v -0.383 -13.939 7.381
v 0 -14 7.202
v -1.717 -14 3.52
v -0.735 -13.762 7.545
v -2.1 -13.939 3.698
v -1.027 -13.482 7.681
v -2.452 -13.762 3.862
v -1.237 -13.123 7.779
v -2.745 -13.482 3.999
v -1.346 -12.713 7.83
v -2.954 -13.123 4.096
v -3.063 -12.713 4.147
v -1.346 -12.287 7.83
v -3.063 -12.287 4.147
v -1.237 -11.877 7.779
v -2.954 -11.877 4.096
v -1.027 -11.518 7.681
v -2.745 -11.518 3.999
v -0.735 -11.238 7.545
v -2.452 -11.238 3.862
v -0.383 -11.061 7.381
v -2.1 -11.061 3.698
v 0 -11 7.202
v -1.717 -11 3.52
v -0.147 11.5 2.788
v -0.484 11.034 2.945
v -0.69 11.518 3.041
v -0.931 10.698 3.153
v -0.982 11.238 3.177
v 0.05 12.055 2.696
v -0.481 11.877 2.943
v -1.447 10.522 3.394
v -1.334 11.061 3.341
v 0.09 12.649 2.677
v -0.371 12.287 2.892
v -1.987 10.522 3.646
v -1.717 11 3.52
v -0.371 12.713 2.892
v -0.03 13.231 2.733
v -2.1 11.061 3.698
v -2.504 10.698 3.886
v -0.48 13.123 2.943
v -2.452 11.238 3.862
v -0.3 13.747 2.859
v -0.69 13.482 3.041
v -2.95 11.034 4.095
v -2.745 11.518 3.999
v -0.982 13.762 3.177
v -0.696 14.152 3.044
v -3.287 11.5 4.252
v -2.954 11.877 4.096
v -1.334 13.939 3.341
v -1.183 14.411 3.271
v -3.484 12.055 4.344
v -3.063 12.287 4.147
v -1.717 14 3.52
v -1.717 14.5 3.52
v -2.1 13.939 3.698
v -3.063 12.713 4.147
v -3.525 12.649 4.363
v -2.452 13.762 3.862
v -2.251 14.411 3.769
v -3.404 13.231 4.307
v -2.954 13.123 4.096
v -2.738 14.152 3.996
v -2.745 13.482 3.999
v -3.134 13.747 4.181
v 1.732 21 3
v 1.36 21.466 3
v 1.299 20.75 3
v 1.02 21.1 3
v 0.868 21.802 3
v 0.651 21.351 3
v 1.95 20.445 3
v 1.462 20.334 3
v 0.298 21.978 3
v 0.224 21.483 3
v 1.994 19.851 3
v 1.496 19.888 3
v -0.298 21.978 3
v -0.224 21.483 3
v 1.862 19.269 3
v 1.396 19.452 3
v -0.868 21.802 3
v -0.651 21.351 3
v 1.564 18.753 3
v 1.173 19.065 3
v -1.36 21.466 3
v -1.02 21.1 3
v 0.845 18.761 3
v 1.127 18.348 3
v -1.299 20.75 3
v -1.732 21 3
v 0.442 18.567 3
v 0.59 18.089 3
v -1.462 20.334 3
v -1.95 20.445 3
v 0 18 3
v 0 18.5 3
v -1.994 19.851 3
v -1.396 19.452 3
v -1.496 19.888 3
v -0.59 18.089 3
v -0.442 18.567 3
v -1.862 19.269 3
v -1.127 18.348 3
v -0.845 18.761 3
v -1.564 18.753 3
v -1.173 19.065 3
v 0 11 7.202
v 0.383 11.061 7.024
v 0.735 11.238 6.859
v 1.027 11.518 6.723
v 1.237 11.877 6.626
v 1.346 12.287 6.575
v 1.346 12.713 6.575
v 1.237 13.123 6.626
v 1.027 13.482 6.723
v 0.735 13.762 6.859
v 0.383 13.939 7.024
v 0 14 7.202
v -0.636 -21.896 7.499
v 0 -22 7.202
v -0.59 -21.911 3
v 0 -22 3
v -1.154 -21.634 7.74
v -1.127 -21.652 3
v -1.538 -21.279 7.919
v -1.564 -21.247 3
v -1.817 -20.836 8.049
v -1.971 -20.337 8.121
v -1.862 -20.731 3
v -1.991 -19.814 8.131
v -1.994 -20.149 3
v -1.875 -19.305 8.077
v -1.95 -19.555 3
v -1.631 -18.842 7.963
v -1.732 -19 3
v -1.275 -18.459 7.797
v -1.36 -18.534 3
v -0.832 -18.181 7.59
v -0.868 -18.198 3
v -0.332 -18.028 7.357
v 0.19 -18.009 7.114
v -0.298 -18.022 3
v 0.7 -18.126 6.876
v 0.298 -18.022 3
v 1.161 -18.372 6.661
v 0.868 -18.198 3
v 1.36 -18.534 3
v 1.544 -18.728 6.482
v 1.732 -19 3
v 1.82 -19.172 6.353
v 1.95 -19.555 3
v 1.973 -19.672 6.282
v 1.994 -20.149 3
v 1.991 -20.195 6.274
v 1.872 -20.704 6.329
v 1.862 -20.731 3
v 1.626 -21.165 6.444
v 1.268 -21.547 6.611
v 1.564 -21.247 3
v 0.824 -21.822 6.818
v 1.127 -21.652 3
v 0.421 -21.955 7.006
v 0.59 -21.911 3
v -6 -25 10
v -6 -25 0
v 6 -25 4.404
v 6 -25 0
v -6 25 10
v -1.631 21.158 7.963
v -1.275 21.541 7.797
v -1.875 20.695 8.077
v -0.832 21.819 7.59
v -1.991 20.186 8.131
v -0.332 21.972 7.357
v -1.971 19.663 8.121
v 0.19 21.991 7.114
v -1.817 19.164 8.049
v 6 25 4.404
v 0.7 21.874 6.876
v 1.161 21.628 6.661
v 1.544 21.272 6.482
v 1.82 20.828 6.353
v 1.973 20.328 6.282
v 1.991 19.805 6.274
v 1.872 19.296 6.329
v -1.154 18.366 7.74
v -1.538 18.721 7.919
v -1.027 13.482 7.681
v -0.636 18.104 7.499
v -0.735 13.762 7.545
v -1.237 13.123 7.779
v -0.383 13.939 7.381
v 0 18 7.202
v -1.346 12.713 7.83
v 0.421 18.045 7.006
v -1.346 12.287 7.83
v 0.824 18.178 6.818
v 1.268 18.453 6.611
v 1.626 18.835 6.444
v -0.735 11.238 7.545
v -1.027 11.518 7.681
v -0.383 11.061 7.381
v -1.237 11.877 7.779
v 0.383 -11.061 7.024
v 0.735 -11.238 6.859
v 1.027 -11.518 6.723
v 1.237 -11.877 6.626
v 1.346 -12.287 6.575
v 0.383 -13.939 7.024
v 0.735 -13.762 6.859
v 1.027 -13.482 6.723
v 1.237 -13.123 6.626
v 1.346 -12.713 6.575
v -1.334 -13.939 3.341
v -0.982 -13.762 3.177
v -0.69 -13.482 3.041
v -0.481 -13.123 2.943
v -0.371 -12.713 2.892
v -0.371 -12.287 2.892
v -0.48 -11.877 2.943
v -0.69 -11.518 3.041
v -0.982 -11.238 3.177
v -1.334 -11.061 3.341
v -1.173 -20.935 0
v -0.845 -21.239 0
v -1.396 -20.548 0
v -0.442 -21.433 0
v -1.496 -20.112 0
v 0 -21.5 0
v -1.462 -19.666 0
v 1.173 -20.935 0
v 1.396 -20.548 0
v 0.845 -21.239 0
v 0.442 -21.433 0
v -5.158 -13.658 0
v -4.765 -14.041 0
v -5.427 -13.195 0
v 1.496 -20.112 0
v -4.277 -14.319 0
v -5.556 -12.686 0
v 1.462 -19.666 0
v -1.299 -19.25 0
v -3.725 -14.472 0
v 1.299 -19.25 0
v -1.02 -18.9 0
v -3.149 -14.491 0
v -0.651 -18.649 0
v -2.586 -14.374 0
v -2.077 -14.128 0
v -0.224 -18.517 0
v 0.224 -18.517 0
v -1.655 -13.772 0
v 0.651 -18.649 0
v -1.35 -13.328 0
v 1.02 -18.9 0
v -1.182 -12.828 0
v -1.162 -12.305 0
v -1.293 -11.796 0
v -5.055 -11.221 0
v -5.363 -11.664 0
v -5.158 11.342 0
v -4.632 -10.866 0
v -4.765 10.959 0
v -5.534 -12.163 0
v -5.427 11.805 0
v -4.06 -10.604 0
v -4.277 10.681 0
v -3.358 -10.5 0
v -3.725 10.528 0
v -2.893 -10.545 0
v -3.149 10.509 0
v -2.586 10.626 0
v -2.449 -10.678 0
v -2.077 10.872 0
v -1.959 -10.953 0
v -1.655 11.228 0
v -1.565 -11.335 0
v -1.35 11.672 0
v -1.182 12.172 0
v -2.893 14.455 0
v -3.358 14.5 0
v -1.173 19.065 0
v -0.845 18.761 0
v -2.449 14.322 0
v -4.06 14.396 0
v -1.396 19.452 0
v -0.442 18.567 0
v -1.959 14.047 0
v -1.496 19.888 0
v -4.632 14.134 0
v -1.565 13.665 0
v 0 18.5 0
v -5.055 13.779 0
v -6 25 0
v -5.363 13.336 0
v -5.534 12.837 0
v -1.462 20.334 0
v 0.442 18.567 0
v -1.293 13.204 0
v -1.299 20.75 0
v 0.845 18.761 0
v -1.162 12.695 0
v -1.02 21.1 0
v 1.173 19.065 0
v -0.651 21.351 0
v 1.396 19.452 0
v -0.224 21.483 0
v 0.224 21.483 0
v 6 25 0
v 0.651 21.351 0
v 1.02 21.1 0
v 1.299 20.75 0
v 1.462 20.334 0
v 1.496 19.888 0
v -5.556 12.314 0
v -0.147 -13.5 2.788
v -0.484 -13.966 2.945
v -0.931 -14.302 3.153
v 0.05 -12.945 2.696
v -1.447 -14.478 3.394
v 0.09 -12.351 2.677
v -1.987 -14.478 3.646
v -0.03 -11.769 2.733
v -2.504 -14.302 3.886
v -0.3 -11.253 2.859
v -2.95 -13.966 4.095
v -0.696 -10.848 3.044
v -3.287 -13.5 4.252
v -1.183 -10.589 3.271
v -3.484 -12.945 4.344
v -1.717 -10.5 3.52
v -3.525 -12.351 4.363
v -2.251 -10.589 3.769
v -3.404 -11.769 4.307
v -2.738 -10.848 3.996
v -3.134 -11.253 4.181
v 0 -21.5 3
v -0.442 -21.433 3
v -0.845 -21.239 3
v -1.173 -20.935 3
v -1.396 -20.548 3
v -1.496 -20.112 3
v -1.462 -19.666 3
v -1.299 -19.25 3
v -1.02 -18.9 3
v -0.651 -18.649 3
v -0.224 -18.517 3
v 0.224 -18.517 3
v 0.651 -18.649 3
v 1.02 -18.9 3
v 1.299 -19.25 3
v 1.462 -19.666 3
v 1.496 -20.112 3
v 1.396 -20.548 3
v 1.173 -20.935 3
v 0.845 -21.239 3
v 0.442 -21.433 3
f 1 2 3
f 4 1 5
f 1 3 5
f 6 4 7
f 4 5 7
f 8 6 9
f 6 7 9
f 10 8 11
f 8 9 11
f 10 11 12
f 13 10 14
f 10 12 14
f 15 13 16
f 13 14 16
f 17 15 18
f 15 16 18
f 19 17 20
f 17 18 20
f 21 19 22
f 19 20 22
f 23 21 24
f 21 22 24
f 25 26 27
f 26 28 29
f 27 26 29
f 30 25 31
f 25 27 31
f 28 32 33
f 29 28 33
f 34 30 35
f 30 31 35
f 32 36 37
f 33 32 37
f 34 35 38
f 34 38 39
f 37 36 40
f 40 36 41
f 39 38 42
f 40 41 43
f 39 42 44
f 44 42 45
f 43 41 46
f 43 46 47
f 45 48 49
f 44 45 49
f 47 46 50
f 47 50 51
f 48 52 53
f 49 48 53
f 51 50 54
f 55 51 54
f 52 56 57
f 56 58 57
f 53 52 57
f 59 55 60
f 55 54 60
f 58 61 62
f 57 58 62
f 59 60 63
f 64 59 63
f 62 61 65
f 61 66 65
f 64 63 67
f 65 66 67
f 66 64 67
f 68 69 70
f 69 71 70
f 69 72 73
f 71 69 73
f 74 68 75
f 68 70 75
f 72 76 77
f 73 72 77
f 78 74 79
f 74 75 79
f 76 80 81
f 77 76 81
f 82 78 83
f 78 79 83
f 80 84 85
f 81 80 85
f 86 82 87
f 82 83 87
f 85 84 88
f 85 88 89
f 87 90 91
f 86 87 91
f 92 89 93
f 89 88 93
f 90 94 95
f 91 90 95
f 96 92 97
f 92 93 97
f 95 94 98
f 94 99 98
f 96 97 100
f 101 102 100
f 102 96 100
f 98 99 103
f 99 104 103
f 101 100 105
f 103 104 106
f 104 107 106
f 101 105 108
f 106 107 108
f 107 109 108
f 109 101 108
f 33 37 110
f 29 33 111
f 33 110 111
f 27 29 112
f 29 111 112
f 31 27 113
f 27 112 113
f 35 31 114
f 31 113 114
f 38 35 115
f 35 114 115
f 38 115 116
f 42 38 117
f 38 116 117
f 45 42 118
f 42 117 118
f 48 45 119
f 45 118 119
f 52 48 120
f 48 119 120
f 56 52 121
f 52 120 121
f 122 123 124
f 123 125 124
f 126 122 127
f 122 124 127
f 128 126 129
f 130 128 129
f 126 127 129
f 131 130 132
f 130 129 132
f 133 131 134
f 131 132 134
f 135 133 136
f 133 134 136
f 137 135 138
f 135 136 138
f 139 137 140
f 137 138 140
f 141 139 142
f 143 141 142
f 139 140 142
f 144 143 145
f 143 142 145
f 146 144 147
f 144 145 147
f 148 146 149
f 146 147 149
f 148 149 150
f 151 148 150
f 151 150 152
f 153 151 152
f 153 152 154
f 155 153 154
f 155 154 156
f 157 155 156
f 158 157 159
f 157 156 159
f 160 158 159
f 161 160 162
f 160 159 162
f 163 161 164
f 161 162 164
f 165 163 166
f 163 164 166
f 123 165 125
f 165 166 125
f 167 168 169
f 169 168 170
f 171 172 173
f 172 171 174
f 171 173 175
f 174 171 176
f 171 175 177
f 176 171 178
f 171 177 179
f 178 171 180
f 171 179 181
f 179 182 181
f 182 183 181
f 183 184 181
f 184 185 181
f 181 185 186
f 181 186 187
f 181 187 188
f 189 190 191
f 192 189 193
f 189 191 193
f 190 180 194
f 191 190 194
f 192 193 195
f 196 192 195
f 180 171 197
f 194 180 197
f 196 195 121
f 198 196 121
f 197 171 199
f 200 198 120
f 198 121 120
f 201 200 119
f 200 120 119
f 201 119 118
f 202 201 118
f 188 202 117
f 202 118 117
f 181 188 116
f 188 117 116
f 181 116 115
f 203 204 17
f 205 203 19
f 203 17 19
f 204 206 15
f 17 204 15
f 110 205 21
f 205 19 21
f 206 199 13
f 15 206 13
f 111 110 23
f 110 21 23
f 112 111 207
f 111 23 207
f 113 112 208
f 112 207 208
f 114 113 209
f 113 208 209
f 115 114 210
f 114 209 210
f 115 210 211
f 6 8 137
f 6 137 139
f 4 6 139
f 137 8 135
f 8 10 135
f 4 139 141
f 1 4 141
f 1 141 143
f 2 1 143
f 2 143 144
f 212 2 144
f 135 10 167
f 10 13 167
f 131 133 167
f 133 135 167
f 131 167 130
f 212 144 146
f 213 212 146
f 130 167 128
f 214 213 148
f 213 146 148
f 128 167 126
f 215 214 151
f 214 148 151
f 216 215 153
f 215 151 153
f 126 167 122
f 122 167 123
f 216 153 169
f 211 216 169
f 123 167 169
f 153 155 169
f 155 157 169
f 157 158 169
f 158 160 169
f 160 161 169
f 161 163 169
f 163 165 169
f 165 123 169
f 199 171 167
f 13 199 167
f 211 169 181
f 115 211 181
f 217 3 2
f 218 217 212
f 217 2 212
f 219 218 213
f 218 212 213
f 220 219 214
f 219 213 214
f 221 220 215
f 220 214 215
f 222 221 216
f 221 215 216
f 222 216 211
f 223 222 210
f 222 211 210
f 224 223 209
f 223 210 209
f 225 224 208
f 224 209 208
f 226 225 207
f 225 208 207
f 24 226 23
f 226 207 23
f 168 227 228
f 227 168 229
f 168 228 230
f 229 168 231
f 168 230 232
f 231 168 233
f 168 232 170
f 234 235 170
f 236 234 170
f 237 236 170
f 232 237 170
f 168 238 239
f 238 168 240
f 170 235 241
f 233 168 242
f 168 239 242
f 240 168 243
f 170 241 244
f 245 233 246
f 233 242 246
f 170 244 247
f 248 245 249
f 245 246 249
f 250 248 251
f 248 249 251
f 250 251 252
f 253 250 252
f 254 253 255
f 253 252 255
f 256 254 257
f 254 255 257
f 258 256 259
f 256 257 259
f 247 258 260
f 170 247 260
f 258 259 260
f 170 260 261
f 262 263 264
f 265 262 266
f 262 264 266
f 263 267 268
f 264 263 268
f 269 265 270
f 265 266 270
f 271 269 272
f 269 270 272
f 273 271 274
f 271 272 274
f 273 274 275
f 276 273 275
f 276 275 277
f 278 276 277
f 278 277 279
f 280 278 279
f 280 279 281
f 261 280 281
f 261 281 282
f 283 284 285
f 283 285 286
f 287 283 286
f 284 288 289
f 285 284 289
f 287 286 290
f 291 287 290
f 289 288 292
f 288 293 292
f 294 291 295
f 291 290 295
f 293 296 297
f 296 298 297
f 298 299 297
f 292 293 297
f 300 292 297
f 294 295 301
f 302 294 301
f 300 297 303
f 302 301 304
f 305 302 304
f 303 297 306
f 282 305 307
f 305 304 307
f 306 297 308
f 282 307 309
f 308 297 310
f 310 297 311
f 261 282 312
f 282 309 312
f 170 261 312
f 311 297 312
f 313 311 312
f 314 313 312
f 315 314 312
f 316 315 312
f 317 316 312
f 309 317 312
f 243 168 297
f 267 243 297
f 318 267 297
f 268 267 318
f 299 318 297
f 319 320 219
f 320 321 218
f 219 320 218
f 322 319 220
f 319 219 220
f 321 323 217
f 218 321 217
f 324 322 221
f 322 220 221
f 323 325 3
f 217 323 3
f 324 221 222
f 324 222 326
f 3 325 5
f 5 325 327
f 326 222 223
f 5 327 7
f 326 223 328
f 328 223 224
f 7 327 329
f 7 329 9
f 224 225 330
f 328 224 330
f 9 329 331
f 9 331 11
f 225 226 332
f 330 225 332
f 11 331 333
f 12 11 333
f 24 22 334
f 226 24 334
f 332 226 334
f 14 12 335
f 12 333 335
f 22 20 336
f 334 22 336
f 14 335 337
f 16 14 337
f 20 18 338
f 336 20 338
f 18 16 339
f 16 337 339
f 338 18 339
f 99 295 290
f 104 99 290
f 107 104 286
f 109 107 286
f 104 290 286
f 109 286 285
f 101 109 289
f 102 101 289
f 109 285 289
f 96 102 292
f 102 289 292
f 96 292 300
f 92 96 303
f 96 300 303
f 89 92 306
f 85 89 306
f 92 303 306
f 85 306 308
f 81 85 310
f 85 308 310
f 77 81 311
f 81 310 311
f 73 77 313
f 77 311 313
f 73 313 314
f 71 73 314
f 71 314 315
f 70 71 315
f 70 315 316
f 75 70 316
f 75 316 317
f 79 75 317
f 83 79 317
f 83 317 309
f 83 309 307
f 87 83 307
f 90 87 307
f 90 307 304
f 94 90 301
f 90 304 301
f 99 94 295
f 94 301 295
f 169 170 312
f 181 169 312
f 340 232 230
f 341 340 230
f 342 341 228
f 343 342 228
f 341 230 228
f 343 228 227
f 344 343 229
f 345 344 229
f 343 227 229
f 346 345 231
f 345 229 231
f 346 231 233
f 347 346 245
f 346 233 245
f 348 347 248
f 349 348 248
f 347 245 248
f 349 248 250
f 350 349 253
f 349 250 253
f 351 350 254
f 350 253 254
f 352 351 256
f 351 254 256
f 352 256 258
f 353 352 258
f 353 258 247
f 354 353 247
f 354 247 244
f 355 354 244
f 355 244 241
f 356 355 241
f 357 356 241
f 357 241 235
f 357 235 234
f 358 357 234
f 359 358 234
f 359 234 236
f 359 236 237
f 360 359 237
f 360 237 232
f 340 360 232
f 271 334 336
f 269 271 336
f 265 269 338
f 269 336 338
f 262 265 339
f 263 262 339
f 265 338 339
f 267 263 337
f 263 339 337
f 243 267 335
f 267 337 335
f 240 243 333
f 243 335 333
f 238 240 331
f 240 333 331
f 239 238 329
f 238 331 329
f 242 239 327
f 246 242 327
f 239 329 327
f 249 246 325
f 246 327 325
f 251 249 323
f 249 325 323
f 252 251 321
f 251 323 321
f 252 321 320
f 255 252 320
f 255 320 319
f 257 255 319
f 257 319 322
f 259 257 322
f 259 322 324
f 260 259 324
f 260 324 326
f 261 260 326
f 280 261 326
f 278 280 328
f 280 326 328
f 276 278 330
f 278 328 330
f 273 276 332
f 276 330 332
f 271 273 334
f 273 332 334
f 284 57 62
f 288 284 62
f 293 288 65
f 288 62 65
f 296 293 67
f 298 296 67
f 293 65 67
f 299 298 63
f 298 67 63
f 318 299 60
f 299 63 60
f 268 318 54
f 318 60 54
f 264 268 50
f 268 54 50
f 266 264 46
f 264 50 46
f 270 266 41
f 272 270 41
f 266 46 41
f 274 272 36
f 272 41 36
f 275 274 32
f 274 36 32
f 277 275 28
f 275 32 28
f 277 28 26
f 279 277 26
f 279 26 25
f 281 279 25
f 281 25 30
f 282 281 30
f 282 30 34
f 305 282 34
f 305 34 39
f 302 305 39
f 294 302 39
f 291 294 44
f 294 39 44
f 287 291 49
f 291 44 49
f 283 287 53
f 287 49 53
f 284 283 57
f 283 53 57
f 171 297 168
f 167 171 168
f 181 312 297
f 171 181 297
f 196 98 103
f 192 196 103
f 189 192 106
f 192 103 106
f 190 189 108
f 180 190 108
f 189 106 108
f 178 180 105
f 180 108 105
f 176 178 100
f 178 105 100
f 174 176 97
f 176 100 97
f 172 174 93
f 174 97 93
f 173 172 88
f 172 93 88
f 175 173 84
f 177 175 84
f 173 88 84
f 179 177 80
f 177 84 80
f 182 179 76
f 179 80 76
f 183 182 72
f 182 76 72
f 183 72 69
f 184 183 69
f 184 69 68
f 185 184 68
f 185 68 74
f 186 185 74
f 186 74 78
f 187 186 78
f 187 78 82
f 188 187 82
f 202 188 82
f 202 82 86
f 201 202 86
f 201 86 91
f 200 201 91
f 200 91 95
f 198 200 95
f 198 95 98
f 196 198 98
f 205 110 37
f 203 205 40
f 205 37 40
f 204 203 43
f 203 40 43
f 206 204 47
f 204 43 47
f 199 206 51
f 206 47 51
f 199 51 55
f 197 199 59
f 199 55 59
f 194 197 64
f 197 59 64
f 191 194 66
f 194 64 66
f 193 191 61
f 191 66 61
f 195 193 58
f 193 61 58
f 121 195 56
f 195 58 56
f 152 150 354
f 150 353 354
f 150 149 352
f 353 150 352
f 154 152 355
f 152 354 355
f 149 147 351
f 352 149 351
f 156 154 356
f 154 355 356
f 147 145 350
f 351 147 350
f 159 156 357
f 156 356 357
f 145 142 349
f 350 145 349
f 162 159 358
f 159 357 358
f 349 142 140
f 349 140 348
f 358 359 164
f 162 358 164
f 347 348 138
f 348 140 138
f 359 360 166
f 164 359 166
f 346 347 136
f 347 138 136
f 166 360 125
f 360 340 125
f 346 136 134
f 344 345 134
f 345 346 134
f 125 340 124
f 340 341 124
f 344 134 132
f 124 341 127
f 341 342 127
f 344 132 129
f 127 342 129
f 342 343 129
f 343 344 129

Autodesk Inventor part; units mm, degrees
ref_plane "YZ Plane" through (0, 0, 0) normal (1, 0, 0) x (0, 1, 0)
ref_plane "XZ Plane" through (0, 0, 0) normal (0, 1, 0) x (-1, 0, 0)
sketch "Skizze1" plane through (0, 0, 0) normal (0, 0, 1) x (1, 0, 0)
  line L0 (-6, -25) -> (6, -25)
  line L1 (6, -25) -> (6, 25)
  line L2 (6, 25) -> (-6, 25)
  line L3 (-6, 25) -> (-6, -25)
  line L4 (-6, -25) -> (6, 25) construction
  line L5 (6, -25) -> (-6, 25) construction
  line L6 (0, 20) -> (0, -20)
  point P0 (0, 0)
  point P1 (0, 0)
  dimension "d0" = 40
  dimension "d1" = 12
  dimension "d2" = 50
extrude "Extrusion1" add sketch "Skizze1" along normal blind 10
sketch "Skizze3" plane through (0, 0, 10) normal (0, 0, 1) x (1, 0, 0)
  line L0 (-6, -25) -> (6, -25) projected
  line L1 (6, -25) -> (6, 25) projected
  line L2 (6, 25) -> (-6, 25) projected
  line L3 (-6, 25) -> (-6, -25) projected
  point P0 (0, 0)
  point P1 (0, -20)
  point P2 (0, 20)
sketch "Skizze2" plane through (-6, -25, 0) normal (0, -1, 0) x (1, 0, 0)
  line L0 (0, 0) -> (12, 0) projected
  line L1 (12, 0) -> (12, 10) projected
  line L2 (0, 10) -> (12, 10) projected
  line L3 (0, 0) -> (0, 10) projected
  line L4 (0, 10) -> (12, 4.4043)
  point P0 (6, 0)
  dimension "d5" = 25
extrude "Extrusion2" cut sketch "Skizze2" against normal through all contours L2 L1 L4
hole "Bohrung1" at (0, 20, 10) at (0, -20, 10) direction (0, 0, -1) diameter 3 end through all counterbore diameter 4 counterbore depth 7
sketch "Skizze4" plane through (-6, -25, 10) normal (0.4226, 0, 0.9063) x (0.9063, 0, -0.4226)
  ellipse E0 centre (6.6203, 45) end of major axis (8.827, 45) minor radius 2 projected
  ellipse E1 centre (6.6203, 5) end of major axis (8.827, 5) minor radius 2 projected
  line L0 (0, 50) -> (13.2405, 50) projected
  line L1 (0, 50) -> (0, 0) projected
  line L2 (13.2405, 0) -> (0, 0) projected
  line L3 (13.2405, 50) -> (13.2405, 0) projected
  line L4 (6.6203, 12.5) -> (6.6203, 37.5)
  line L5 (0, 50) -> (0, 0) projected
  line L6 (0, 25) -> (13.2405, 25)
  line L7 (13.2405, 50) -> (13.2405, 0) projected
  point P0 (9.664, 25)
  point P1 (6.6203, 25)
  dimension "d15" = 25
hole "Bohrung2" at (0, -12.5, 7.2022) at (0, 12.5, 7.2022) direction (-0.4226, 0, -0.9063) diameter 3 end through all
ref_plane "Arbeitsebene1" through (-6, 25, 0) normal (0.4226, 0, 0.9063) x (0.9063, 0, -0.4226)
sketch "Skizze5" plane through (-6, 25, 0) normal (0.4226, 0, 0.9063) x (0.9063, 0, -0.4226)
  circle A0 centre (2.3941, -37.5) radius 1.5 projected
  circle A1 centre (2.3941, -12.5) radius 1.5 projected
  ellipse E0 centre (2.3941, -5) end of major axis (4.6008, -5) minor radius 2 projected
  ellipse E1 centre (2.3941, -45) end of major axis (4.6008, -45) minor radius 2 projected
  line L0 (-4.2262, 0) -> (9.0144, 0) projected
  line L1 (-4.2262, 0) -> (-4.2262, -50) projected
  line L2 (9.0144, -50) -> (-4.2262, -50) projected
  line L3 (9.0144, 0) -> (9.0144, -50) projected
  point P0 (5.4378, -25)
hole "Bohrung3" at (-3.8302, 12.5, -1.0118) at (-3.8302, -12.5, -1.0118) direction (0.4226, 0, 0.9063) diameter 3 end through all counterbore diameter 4 counterbore depth 5
properties part number "Mount"
